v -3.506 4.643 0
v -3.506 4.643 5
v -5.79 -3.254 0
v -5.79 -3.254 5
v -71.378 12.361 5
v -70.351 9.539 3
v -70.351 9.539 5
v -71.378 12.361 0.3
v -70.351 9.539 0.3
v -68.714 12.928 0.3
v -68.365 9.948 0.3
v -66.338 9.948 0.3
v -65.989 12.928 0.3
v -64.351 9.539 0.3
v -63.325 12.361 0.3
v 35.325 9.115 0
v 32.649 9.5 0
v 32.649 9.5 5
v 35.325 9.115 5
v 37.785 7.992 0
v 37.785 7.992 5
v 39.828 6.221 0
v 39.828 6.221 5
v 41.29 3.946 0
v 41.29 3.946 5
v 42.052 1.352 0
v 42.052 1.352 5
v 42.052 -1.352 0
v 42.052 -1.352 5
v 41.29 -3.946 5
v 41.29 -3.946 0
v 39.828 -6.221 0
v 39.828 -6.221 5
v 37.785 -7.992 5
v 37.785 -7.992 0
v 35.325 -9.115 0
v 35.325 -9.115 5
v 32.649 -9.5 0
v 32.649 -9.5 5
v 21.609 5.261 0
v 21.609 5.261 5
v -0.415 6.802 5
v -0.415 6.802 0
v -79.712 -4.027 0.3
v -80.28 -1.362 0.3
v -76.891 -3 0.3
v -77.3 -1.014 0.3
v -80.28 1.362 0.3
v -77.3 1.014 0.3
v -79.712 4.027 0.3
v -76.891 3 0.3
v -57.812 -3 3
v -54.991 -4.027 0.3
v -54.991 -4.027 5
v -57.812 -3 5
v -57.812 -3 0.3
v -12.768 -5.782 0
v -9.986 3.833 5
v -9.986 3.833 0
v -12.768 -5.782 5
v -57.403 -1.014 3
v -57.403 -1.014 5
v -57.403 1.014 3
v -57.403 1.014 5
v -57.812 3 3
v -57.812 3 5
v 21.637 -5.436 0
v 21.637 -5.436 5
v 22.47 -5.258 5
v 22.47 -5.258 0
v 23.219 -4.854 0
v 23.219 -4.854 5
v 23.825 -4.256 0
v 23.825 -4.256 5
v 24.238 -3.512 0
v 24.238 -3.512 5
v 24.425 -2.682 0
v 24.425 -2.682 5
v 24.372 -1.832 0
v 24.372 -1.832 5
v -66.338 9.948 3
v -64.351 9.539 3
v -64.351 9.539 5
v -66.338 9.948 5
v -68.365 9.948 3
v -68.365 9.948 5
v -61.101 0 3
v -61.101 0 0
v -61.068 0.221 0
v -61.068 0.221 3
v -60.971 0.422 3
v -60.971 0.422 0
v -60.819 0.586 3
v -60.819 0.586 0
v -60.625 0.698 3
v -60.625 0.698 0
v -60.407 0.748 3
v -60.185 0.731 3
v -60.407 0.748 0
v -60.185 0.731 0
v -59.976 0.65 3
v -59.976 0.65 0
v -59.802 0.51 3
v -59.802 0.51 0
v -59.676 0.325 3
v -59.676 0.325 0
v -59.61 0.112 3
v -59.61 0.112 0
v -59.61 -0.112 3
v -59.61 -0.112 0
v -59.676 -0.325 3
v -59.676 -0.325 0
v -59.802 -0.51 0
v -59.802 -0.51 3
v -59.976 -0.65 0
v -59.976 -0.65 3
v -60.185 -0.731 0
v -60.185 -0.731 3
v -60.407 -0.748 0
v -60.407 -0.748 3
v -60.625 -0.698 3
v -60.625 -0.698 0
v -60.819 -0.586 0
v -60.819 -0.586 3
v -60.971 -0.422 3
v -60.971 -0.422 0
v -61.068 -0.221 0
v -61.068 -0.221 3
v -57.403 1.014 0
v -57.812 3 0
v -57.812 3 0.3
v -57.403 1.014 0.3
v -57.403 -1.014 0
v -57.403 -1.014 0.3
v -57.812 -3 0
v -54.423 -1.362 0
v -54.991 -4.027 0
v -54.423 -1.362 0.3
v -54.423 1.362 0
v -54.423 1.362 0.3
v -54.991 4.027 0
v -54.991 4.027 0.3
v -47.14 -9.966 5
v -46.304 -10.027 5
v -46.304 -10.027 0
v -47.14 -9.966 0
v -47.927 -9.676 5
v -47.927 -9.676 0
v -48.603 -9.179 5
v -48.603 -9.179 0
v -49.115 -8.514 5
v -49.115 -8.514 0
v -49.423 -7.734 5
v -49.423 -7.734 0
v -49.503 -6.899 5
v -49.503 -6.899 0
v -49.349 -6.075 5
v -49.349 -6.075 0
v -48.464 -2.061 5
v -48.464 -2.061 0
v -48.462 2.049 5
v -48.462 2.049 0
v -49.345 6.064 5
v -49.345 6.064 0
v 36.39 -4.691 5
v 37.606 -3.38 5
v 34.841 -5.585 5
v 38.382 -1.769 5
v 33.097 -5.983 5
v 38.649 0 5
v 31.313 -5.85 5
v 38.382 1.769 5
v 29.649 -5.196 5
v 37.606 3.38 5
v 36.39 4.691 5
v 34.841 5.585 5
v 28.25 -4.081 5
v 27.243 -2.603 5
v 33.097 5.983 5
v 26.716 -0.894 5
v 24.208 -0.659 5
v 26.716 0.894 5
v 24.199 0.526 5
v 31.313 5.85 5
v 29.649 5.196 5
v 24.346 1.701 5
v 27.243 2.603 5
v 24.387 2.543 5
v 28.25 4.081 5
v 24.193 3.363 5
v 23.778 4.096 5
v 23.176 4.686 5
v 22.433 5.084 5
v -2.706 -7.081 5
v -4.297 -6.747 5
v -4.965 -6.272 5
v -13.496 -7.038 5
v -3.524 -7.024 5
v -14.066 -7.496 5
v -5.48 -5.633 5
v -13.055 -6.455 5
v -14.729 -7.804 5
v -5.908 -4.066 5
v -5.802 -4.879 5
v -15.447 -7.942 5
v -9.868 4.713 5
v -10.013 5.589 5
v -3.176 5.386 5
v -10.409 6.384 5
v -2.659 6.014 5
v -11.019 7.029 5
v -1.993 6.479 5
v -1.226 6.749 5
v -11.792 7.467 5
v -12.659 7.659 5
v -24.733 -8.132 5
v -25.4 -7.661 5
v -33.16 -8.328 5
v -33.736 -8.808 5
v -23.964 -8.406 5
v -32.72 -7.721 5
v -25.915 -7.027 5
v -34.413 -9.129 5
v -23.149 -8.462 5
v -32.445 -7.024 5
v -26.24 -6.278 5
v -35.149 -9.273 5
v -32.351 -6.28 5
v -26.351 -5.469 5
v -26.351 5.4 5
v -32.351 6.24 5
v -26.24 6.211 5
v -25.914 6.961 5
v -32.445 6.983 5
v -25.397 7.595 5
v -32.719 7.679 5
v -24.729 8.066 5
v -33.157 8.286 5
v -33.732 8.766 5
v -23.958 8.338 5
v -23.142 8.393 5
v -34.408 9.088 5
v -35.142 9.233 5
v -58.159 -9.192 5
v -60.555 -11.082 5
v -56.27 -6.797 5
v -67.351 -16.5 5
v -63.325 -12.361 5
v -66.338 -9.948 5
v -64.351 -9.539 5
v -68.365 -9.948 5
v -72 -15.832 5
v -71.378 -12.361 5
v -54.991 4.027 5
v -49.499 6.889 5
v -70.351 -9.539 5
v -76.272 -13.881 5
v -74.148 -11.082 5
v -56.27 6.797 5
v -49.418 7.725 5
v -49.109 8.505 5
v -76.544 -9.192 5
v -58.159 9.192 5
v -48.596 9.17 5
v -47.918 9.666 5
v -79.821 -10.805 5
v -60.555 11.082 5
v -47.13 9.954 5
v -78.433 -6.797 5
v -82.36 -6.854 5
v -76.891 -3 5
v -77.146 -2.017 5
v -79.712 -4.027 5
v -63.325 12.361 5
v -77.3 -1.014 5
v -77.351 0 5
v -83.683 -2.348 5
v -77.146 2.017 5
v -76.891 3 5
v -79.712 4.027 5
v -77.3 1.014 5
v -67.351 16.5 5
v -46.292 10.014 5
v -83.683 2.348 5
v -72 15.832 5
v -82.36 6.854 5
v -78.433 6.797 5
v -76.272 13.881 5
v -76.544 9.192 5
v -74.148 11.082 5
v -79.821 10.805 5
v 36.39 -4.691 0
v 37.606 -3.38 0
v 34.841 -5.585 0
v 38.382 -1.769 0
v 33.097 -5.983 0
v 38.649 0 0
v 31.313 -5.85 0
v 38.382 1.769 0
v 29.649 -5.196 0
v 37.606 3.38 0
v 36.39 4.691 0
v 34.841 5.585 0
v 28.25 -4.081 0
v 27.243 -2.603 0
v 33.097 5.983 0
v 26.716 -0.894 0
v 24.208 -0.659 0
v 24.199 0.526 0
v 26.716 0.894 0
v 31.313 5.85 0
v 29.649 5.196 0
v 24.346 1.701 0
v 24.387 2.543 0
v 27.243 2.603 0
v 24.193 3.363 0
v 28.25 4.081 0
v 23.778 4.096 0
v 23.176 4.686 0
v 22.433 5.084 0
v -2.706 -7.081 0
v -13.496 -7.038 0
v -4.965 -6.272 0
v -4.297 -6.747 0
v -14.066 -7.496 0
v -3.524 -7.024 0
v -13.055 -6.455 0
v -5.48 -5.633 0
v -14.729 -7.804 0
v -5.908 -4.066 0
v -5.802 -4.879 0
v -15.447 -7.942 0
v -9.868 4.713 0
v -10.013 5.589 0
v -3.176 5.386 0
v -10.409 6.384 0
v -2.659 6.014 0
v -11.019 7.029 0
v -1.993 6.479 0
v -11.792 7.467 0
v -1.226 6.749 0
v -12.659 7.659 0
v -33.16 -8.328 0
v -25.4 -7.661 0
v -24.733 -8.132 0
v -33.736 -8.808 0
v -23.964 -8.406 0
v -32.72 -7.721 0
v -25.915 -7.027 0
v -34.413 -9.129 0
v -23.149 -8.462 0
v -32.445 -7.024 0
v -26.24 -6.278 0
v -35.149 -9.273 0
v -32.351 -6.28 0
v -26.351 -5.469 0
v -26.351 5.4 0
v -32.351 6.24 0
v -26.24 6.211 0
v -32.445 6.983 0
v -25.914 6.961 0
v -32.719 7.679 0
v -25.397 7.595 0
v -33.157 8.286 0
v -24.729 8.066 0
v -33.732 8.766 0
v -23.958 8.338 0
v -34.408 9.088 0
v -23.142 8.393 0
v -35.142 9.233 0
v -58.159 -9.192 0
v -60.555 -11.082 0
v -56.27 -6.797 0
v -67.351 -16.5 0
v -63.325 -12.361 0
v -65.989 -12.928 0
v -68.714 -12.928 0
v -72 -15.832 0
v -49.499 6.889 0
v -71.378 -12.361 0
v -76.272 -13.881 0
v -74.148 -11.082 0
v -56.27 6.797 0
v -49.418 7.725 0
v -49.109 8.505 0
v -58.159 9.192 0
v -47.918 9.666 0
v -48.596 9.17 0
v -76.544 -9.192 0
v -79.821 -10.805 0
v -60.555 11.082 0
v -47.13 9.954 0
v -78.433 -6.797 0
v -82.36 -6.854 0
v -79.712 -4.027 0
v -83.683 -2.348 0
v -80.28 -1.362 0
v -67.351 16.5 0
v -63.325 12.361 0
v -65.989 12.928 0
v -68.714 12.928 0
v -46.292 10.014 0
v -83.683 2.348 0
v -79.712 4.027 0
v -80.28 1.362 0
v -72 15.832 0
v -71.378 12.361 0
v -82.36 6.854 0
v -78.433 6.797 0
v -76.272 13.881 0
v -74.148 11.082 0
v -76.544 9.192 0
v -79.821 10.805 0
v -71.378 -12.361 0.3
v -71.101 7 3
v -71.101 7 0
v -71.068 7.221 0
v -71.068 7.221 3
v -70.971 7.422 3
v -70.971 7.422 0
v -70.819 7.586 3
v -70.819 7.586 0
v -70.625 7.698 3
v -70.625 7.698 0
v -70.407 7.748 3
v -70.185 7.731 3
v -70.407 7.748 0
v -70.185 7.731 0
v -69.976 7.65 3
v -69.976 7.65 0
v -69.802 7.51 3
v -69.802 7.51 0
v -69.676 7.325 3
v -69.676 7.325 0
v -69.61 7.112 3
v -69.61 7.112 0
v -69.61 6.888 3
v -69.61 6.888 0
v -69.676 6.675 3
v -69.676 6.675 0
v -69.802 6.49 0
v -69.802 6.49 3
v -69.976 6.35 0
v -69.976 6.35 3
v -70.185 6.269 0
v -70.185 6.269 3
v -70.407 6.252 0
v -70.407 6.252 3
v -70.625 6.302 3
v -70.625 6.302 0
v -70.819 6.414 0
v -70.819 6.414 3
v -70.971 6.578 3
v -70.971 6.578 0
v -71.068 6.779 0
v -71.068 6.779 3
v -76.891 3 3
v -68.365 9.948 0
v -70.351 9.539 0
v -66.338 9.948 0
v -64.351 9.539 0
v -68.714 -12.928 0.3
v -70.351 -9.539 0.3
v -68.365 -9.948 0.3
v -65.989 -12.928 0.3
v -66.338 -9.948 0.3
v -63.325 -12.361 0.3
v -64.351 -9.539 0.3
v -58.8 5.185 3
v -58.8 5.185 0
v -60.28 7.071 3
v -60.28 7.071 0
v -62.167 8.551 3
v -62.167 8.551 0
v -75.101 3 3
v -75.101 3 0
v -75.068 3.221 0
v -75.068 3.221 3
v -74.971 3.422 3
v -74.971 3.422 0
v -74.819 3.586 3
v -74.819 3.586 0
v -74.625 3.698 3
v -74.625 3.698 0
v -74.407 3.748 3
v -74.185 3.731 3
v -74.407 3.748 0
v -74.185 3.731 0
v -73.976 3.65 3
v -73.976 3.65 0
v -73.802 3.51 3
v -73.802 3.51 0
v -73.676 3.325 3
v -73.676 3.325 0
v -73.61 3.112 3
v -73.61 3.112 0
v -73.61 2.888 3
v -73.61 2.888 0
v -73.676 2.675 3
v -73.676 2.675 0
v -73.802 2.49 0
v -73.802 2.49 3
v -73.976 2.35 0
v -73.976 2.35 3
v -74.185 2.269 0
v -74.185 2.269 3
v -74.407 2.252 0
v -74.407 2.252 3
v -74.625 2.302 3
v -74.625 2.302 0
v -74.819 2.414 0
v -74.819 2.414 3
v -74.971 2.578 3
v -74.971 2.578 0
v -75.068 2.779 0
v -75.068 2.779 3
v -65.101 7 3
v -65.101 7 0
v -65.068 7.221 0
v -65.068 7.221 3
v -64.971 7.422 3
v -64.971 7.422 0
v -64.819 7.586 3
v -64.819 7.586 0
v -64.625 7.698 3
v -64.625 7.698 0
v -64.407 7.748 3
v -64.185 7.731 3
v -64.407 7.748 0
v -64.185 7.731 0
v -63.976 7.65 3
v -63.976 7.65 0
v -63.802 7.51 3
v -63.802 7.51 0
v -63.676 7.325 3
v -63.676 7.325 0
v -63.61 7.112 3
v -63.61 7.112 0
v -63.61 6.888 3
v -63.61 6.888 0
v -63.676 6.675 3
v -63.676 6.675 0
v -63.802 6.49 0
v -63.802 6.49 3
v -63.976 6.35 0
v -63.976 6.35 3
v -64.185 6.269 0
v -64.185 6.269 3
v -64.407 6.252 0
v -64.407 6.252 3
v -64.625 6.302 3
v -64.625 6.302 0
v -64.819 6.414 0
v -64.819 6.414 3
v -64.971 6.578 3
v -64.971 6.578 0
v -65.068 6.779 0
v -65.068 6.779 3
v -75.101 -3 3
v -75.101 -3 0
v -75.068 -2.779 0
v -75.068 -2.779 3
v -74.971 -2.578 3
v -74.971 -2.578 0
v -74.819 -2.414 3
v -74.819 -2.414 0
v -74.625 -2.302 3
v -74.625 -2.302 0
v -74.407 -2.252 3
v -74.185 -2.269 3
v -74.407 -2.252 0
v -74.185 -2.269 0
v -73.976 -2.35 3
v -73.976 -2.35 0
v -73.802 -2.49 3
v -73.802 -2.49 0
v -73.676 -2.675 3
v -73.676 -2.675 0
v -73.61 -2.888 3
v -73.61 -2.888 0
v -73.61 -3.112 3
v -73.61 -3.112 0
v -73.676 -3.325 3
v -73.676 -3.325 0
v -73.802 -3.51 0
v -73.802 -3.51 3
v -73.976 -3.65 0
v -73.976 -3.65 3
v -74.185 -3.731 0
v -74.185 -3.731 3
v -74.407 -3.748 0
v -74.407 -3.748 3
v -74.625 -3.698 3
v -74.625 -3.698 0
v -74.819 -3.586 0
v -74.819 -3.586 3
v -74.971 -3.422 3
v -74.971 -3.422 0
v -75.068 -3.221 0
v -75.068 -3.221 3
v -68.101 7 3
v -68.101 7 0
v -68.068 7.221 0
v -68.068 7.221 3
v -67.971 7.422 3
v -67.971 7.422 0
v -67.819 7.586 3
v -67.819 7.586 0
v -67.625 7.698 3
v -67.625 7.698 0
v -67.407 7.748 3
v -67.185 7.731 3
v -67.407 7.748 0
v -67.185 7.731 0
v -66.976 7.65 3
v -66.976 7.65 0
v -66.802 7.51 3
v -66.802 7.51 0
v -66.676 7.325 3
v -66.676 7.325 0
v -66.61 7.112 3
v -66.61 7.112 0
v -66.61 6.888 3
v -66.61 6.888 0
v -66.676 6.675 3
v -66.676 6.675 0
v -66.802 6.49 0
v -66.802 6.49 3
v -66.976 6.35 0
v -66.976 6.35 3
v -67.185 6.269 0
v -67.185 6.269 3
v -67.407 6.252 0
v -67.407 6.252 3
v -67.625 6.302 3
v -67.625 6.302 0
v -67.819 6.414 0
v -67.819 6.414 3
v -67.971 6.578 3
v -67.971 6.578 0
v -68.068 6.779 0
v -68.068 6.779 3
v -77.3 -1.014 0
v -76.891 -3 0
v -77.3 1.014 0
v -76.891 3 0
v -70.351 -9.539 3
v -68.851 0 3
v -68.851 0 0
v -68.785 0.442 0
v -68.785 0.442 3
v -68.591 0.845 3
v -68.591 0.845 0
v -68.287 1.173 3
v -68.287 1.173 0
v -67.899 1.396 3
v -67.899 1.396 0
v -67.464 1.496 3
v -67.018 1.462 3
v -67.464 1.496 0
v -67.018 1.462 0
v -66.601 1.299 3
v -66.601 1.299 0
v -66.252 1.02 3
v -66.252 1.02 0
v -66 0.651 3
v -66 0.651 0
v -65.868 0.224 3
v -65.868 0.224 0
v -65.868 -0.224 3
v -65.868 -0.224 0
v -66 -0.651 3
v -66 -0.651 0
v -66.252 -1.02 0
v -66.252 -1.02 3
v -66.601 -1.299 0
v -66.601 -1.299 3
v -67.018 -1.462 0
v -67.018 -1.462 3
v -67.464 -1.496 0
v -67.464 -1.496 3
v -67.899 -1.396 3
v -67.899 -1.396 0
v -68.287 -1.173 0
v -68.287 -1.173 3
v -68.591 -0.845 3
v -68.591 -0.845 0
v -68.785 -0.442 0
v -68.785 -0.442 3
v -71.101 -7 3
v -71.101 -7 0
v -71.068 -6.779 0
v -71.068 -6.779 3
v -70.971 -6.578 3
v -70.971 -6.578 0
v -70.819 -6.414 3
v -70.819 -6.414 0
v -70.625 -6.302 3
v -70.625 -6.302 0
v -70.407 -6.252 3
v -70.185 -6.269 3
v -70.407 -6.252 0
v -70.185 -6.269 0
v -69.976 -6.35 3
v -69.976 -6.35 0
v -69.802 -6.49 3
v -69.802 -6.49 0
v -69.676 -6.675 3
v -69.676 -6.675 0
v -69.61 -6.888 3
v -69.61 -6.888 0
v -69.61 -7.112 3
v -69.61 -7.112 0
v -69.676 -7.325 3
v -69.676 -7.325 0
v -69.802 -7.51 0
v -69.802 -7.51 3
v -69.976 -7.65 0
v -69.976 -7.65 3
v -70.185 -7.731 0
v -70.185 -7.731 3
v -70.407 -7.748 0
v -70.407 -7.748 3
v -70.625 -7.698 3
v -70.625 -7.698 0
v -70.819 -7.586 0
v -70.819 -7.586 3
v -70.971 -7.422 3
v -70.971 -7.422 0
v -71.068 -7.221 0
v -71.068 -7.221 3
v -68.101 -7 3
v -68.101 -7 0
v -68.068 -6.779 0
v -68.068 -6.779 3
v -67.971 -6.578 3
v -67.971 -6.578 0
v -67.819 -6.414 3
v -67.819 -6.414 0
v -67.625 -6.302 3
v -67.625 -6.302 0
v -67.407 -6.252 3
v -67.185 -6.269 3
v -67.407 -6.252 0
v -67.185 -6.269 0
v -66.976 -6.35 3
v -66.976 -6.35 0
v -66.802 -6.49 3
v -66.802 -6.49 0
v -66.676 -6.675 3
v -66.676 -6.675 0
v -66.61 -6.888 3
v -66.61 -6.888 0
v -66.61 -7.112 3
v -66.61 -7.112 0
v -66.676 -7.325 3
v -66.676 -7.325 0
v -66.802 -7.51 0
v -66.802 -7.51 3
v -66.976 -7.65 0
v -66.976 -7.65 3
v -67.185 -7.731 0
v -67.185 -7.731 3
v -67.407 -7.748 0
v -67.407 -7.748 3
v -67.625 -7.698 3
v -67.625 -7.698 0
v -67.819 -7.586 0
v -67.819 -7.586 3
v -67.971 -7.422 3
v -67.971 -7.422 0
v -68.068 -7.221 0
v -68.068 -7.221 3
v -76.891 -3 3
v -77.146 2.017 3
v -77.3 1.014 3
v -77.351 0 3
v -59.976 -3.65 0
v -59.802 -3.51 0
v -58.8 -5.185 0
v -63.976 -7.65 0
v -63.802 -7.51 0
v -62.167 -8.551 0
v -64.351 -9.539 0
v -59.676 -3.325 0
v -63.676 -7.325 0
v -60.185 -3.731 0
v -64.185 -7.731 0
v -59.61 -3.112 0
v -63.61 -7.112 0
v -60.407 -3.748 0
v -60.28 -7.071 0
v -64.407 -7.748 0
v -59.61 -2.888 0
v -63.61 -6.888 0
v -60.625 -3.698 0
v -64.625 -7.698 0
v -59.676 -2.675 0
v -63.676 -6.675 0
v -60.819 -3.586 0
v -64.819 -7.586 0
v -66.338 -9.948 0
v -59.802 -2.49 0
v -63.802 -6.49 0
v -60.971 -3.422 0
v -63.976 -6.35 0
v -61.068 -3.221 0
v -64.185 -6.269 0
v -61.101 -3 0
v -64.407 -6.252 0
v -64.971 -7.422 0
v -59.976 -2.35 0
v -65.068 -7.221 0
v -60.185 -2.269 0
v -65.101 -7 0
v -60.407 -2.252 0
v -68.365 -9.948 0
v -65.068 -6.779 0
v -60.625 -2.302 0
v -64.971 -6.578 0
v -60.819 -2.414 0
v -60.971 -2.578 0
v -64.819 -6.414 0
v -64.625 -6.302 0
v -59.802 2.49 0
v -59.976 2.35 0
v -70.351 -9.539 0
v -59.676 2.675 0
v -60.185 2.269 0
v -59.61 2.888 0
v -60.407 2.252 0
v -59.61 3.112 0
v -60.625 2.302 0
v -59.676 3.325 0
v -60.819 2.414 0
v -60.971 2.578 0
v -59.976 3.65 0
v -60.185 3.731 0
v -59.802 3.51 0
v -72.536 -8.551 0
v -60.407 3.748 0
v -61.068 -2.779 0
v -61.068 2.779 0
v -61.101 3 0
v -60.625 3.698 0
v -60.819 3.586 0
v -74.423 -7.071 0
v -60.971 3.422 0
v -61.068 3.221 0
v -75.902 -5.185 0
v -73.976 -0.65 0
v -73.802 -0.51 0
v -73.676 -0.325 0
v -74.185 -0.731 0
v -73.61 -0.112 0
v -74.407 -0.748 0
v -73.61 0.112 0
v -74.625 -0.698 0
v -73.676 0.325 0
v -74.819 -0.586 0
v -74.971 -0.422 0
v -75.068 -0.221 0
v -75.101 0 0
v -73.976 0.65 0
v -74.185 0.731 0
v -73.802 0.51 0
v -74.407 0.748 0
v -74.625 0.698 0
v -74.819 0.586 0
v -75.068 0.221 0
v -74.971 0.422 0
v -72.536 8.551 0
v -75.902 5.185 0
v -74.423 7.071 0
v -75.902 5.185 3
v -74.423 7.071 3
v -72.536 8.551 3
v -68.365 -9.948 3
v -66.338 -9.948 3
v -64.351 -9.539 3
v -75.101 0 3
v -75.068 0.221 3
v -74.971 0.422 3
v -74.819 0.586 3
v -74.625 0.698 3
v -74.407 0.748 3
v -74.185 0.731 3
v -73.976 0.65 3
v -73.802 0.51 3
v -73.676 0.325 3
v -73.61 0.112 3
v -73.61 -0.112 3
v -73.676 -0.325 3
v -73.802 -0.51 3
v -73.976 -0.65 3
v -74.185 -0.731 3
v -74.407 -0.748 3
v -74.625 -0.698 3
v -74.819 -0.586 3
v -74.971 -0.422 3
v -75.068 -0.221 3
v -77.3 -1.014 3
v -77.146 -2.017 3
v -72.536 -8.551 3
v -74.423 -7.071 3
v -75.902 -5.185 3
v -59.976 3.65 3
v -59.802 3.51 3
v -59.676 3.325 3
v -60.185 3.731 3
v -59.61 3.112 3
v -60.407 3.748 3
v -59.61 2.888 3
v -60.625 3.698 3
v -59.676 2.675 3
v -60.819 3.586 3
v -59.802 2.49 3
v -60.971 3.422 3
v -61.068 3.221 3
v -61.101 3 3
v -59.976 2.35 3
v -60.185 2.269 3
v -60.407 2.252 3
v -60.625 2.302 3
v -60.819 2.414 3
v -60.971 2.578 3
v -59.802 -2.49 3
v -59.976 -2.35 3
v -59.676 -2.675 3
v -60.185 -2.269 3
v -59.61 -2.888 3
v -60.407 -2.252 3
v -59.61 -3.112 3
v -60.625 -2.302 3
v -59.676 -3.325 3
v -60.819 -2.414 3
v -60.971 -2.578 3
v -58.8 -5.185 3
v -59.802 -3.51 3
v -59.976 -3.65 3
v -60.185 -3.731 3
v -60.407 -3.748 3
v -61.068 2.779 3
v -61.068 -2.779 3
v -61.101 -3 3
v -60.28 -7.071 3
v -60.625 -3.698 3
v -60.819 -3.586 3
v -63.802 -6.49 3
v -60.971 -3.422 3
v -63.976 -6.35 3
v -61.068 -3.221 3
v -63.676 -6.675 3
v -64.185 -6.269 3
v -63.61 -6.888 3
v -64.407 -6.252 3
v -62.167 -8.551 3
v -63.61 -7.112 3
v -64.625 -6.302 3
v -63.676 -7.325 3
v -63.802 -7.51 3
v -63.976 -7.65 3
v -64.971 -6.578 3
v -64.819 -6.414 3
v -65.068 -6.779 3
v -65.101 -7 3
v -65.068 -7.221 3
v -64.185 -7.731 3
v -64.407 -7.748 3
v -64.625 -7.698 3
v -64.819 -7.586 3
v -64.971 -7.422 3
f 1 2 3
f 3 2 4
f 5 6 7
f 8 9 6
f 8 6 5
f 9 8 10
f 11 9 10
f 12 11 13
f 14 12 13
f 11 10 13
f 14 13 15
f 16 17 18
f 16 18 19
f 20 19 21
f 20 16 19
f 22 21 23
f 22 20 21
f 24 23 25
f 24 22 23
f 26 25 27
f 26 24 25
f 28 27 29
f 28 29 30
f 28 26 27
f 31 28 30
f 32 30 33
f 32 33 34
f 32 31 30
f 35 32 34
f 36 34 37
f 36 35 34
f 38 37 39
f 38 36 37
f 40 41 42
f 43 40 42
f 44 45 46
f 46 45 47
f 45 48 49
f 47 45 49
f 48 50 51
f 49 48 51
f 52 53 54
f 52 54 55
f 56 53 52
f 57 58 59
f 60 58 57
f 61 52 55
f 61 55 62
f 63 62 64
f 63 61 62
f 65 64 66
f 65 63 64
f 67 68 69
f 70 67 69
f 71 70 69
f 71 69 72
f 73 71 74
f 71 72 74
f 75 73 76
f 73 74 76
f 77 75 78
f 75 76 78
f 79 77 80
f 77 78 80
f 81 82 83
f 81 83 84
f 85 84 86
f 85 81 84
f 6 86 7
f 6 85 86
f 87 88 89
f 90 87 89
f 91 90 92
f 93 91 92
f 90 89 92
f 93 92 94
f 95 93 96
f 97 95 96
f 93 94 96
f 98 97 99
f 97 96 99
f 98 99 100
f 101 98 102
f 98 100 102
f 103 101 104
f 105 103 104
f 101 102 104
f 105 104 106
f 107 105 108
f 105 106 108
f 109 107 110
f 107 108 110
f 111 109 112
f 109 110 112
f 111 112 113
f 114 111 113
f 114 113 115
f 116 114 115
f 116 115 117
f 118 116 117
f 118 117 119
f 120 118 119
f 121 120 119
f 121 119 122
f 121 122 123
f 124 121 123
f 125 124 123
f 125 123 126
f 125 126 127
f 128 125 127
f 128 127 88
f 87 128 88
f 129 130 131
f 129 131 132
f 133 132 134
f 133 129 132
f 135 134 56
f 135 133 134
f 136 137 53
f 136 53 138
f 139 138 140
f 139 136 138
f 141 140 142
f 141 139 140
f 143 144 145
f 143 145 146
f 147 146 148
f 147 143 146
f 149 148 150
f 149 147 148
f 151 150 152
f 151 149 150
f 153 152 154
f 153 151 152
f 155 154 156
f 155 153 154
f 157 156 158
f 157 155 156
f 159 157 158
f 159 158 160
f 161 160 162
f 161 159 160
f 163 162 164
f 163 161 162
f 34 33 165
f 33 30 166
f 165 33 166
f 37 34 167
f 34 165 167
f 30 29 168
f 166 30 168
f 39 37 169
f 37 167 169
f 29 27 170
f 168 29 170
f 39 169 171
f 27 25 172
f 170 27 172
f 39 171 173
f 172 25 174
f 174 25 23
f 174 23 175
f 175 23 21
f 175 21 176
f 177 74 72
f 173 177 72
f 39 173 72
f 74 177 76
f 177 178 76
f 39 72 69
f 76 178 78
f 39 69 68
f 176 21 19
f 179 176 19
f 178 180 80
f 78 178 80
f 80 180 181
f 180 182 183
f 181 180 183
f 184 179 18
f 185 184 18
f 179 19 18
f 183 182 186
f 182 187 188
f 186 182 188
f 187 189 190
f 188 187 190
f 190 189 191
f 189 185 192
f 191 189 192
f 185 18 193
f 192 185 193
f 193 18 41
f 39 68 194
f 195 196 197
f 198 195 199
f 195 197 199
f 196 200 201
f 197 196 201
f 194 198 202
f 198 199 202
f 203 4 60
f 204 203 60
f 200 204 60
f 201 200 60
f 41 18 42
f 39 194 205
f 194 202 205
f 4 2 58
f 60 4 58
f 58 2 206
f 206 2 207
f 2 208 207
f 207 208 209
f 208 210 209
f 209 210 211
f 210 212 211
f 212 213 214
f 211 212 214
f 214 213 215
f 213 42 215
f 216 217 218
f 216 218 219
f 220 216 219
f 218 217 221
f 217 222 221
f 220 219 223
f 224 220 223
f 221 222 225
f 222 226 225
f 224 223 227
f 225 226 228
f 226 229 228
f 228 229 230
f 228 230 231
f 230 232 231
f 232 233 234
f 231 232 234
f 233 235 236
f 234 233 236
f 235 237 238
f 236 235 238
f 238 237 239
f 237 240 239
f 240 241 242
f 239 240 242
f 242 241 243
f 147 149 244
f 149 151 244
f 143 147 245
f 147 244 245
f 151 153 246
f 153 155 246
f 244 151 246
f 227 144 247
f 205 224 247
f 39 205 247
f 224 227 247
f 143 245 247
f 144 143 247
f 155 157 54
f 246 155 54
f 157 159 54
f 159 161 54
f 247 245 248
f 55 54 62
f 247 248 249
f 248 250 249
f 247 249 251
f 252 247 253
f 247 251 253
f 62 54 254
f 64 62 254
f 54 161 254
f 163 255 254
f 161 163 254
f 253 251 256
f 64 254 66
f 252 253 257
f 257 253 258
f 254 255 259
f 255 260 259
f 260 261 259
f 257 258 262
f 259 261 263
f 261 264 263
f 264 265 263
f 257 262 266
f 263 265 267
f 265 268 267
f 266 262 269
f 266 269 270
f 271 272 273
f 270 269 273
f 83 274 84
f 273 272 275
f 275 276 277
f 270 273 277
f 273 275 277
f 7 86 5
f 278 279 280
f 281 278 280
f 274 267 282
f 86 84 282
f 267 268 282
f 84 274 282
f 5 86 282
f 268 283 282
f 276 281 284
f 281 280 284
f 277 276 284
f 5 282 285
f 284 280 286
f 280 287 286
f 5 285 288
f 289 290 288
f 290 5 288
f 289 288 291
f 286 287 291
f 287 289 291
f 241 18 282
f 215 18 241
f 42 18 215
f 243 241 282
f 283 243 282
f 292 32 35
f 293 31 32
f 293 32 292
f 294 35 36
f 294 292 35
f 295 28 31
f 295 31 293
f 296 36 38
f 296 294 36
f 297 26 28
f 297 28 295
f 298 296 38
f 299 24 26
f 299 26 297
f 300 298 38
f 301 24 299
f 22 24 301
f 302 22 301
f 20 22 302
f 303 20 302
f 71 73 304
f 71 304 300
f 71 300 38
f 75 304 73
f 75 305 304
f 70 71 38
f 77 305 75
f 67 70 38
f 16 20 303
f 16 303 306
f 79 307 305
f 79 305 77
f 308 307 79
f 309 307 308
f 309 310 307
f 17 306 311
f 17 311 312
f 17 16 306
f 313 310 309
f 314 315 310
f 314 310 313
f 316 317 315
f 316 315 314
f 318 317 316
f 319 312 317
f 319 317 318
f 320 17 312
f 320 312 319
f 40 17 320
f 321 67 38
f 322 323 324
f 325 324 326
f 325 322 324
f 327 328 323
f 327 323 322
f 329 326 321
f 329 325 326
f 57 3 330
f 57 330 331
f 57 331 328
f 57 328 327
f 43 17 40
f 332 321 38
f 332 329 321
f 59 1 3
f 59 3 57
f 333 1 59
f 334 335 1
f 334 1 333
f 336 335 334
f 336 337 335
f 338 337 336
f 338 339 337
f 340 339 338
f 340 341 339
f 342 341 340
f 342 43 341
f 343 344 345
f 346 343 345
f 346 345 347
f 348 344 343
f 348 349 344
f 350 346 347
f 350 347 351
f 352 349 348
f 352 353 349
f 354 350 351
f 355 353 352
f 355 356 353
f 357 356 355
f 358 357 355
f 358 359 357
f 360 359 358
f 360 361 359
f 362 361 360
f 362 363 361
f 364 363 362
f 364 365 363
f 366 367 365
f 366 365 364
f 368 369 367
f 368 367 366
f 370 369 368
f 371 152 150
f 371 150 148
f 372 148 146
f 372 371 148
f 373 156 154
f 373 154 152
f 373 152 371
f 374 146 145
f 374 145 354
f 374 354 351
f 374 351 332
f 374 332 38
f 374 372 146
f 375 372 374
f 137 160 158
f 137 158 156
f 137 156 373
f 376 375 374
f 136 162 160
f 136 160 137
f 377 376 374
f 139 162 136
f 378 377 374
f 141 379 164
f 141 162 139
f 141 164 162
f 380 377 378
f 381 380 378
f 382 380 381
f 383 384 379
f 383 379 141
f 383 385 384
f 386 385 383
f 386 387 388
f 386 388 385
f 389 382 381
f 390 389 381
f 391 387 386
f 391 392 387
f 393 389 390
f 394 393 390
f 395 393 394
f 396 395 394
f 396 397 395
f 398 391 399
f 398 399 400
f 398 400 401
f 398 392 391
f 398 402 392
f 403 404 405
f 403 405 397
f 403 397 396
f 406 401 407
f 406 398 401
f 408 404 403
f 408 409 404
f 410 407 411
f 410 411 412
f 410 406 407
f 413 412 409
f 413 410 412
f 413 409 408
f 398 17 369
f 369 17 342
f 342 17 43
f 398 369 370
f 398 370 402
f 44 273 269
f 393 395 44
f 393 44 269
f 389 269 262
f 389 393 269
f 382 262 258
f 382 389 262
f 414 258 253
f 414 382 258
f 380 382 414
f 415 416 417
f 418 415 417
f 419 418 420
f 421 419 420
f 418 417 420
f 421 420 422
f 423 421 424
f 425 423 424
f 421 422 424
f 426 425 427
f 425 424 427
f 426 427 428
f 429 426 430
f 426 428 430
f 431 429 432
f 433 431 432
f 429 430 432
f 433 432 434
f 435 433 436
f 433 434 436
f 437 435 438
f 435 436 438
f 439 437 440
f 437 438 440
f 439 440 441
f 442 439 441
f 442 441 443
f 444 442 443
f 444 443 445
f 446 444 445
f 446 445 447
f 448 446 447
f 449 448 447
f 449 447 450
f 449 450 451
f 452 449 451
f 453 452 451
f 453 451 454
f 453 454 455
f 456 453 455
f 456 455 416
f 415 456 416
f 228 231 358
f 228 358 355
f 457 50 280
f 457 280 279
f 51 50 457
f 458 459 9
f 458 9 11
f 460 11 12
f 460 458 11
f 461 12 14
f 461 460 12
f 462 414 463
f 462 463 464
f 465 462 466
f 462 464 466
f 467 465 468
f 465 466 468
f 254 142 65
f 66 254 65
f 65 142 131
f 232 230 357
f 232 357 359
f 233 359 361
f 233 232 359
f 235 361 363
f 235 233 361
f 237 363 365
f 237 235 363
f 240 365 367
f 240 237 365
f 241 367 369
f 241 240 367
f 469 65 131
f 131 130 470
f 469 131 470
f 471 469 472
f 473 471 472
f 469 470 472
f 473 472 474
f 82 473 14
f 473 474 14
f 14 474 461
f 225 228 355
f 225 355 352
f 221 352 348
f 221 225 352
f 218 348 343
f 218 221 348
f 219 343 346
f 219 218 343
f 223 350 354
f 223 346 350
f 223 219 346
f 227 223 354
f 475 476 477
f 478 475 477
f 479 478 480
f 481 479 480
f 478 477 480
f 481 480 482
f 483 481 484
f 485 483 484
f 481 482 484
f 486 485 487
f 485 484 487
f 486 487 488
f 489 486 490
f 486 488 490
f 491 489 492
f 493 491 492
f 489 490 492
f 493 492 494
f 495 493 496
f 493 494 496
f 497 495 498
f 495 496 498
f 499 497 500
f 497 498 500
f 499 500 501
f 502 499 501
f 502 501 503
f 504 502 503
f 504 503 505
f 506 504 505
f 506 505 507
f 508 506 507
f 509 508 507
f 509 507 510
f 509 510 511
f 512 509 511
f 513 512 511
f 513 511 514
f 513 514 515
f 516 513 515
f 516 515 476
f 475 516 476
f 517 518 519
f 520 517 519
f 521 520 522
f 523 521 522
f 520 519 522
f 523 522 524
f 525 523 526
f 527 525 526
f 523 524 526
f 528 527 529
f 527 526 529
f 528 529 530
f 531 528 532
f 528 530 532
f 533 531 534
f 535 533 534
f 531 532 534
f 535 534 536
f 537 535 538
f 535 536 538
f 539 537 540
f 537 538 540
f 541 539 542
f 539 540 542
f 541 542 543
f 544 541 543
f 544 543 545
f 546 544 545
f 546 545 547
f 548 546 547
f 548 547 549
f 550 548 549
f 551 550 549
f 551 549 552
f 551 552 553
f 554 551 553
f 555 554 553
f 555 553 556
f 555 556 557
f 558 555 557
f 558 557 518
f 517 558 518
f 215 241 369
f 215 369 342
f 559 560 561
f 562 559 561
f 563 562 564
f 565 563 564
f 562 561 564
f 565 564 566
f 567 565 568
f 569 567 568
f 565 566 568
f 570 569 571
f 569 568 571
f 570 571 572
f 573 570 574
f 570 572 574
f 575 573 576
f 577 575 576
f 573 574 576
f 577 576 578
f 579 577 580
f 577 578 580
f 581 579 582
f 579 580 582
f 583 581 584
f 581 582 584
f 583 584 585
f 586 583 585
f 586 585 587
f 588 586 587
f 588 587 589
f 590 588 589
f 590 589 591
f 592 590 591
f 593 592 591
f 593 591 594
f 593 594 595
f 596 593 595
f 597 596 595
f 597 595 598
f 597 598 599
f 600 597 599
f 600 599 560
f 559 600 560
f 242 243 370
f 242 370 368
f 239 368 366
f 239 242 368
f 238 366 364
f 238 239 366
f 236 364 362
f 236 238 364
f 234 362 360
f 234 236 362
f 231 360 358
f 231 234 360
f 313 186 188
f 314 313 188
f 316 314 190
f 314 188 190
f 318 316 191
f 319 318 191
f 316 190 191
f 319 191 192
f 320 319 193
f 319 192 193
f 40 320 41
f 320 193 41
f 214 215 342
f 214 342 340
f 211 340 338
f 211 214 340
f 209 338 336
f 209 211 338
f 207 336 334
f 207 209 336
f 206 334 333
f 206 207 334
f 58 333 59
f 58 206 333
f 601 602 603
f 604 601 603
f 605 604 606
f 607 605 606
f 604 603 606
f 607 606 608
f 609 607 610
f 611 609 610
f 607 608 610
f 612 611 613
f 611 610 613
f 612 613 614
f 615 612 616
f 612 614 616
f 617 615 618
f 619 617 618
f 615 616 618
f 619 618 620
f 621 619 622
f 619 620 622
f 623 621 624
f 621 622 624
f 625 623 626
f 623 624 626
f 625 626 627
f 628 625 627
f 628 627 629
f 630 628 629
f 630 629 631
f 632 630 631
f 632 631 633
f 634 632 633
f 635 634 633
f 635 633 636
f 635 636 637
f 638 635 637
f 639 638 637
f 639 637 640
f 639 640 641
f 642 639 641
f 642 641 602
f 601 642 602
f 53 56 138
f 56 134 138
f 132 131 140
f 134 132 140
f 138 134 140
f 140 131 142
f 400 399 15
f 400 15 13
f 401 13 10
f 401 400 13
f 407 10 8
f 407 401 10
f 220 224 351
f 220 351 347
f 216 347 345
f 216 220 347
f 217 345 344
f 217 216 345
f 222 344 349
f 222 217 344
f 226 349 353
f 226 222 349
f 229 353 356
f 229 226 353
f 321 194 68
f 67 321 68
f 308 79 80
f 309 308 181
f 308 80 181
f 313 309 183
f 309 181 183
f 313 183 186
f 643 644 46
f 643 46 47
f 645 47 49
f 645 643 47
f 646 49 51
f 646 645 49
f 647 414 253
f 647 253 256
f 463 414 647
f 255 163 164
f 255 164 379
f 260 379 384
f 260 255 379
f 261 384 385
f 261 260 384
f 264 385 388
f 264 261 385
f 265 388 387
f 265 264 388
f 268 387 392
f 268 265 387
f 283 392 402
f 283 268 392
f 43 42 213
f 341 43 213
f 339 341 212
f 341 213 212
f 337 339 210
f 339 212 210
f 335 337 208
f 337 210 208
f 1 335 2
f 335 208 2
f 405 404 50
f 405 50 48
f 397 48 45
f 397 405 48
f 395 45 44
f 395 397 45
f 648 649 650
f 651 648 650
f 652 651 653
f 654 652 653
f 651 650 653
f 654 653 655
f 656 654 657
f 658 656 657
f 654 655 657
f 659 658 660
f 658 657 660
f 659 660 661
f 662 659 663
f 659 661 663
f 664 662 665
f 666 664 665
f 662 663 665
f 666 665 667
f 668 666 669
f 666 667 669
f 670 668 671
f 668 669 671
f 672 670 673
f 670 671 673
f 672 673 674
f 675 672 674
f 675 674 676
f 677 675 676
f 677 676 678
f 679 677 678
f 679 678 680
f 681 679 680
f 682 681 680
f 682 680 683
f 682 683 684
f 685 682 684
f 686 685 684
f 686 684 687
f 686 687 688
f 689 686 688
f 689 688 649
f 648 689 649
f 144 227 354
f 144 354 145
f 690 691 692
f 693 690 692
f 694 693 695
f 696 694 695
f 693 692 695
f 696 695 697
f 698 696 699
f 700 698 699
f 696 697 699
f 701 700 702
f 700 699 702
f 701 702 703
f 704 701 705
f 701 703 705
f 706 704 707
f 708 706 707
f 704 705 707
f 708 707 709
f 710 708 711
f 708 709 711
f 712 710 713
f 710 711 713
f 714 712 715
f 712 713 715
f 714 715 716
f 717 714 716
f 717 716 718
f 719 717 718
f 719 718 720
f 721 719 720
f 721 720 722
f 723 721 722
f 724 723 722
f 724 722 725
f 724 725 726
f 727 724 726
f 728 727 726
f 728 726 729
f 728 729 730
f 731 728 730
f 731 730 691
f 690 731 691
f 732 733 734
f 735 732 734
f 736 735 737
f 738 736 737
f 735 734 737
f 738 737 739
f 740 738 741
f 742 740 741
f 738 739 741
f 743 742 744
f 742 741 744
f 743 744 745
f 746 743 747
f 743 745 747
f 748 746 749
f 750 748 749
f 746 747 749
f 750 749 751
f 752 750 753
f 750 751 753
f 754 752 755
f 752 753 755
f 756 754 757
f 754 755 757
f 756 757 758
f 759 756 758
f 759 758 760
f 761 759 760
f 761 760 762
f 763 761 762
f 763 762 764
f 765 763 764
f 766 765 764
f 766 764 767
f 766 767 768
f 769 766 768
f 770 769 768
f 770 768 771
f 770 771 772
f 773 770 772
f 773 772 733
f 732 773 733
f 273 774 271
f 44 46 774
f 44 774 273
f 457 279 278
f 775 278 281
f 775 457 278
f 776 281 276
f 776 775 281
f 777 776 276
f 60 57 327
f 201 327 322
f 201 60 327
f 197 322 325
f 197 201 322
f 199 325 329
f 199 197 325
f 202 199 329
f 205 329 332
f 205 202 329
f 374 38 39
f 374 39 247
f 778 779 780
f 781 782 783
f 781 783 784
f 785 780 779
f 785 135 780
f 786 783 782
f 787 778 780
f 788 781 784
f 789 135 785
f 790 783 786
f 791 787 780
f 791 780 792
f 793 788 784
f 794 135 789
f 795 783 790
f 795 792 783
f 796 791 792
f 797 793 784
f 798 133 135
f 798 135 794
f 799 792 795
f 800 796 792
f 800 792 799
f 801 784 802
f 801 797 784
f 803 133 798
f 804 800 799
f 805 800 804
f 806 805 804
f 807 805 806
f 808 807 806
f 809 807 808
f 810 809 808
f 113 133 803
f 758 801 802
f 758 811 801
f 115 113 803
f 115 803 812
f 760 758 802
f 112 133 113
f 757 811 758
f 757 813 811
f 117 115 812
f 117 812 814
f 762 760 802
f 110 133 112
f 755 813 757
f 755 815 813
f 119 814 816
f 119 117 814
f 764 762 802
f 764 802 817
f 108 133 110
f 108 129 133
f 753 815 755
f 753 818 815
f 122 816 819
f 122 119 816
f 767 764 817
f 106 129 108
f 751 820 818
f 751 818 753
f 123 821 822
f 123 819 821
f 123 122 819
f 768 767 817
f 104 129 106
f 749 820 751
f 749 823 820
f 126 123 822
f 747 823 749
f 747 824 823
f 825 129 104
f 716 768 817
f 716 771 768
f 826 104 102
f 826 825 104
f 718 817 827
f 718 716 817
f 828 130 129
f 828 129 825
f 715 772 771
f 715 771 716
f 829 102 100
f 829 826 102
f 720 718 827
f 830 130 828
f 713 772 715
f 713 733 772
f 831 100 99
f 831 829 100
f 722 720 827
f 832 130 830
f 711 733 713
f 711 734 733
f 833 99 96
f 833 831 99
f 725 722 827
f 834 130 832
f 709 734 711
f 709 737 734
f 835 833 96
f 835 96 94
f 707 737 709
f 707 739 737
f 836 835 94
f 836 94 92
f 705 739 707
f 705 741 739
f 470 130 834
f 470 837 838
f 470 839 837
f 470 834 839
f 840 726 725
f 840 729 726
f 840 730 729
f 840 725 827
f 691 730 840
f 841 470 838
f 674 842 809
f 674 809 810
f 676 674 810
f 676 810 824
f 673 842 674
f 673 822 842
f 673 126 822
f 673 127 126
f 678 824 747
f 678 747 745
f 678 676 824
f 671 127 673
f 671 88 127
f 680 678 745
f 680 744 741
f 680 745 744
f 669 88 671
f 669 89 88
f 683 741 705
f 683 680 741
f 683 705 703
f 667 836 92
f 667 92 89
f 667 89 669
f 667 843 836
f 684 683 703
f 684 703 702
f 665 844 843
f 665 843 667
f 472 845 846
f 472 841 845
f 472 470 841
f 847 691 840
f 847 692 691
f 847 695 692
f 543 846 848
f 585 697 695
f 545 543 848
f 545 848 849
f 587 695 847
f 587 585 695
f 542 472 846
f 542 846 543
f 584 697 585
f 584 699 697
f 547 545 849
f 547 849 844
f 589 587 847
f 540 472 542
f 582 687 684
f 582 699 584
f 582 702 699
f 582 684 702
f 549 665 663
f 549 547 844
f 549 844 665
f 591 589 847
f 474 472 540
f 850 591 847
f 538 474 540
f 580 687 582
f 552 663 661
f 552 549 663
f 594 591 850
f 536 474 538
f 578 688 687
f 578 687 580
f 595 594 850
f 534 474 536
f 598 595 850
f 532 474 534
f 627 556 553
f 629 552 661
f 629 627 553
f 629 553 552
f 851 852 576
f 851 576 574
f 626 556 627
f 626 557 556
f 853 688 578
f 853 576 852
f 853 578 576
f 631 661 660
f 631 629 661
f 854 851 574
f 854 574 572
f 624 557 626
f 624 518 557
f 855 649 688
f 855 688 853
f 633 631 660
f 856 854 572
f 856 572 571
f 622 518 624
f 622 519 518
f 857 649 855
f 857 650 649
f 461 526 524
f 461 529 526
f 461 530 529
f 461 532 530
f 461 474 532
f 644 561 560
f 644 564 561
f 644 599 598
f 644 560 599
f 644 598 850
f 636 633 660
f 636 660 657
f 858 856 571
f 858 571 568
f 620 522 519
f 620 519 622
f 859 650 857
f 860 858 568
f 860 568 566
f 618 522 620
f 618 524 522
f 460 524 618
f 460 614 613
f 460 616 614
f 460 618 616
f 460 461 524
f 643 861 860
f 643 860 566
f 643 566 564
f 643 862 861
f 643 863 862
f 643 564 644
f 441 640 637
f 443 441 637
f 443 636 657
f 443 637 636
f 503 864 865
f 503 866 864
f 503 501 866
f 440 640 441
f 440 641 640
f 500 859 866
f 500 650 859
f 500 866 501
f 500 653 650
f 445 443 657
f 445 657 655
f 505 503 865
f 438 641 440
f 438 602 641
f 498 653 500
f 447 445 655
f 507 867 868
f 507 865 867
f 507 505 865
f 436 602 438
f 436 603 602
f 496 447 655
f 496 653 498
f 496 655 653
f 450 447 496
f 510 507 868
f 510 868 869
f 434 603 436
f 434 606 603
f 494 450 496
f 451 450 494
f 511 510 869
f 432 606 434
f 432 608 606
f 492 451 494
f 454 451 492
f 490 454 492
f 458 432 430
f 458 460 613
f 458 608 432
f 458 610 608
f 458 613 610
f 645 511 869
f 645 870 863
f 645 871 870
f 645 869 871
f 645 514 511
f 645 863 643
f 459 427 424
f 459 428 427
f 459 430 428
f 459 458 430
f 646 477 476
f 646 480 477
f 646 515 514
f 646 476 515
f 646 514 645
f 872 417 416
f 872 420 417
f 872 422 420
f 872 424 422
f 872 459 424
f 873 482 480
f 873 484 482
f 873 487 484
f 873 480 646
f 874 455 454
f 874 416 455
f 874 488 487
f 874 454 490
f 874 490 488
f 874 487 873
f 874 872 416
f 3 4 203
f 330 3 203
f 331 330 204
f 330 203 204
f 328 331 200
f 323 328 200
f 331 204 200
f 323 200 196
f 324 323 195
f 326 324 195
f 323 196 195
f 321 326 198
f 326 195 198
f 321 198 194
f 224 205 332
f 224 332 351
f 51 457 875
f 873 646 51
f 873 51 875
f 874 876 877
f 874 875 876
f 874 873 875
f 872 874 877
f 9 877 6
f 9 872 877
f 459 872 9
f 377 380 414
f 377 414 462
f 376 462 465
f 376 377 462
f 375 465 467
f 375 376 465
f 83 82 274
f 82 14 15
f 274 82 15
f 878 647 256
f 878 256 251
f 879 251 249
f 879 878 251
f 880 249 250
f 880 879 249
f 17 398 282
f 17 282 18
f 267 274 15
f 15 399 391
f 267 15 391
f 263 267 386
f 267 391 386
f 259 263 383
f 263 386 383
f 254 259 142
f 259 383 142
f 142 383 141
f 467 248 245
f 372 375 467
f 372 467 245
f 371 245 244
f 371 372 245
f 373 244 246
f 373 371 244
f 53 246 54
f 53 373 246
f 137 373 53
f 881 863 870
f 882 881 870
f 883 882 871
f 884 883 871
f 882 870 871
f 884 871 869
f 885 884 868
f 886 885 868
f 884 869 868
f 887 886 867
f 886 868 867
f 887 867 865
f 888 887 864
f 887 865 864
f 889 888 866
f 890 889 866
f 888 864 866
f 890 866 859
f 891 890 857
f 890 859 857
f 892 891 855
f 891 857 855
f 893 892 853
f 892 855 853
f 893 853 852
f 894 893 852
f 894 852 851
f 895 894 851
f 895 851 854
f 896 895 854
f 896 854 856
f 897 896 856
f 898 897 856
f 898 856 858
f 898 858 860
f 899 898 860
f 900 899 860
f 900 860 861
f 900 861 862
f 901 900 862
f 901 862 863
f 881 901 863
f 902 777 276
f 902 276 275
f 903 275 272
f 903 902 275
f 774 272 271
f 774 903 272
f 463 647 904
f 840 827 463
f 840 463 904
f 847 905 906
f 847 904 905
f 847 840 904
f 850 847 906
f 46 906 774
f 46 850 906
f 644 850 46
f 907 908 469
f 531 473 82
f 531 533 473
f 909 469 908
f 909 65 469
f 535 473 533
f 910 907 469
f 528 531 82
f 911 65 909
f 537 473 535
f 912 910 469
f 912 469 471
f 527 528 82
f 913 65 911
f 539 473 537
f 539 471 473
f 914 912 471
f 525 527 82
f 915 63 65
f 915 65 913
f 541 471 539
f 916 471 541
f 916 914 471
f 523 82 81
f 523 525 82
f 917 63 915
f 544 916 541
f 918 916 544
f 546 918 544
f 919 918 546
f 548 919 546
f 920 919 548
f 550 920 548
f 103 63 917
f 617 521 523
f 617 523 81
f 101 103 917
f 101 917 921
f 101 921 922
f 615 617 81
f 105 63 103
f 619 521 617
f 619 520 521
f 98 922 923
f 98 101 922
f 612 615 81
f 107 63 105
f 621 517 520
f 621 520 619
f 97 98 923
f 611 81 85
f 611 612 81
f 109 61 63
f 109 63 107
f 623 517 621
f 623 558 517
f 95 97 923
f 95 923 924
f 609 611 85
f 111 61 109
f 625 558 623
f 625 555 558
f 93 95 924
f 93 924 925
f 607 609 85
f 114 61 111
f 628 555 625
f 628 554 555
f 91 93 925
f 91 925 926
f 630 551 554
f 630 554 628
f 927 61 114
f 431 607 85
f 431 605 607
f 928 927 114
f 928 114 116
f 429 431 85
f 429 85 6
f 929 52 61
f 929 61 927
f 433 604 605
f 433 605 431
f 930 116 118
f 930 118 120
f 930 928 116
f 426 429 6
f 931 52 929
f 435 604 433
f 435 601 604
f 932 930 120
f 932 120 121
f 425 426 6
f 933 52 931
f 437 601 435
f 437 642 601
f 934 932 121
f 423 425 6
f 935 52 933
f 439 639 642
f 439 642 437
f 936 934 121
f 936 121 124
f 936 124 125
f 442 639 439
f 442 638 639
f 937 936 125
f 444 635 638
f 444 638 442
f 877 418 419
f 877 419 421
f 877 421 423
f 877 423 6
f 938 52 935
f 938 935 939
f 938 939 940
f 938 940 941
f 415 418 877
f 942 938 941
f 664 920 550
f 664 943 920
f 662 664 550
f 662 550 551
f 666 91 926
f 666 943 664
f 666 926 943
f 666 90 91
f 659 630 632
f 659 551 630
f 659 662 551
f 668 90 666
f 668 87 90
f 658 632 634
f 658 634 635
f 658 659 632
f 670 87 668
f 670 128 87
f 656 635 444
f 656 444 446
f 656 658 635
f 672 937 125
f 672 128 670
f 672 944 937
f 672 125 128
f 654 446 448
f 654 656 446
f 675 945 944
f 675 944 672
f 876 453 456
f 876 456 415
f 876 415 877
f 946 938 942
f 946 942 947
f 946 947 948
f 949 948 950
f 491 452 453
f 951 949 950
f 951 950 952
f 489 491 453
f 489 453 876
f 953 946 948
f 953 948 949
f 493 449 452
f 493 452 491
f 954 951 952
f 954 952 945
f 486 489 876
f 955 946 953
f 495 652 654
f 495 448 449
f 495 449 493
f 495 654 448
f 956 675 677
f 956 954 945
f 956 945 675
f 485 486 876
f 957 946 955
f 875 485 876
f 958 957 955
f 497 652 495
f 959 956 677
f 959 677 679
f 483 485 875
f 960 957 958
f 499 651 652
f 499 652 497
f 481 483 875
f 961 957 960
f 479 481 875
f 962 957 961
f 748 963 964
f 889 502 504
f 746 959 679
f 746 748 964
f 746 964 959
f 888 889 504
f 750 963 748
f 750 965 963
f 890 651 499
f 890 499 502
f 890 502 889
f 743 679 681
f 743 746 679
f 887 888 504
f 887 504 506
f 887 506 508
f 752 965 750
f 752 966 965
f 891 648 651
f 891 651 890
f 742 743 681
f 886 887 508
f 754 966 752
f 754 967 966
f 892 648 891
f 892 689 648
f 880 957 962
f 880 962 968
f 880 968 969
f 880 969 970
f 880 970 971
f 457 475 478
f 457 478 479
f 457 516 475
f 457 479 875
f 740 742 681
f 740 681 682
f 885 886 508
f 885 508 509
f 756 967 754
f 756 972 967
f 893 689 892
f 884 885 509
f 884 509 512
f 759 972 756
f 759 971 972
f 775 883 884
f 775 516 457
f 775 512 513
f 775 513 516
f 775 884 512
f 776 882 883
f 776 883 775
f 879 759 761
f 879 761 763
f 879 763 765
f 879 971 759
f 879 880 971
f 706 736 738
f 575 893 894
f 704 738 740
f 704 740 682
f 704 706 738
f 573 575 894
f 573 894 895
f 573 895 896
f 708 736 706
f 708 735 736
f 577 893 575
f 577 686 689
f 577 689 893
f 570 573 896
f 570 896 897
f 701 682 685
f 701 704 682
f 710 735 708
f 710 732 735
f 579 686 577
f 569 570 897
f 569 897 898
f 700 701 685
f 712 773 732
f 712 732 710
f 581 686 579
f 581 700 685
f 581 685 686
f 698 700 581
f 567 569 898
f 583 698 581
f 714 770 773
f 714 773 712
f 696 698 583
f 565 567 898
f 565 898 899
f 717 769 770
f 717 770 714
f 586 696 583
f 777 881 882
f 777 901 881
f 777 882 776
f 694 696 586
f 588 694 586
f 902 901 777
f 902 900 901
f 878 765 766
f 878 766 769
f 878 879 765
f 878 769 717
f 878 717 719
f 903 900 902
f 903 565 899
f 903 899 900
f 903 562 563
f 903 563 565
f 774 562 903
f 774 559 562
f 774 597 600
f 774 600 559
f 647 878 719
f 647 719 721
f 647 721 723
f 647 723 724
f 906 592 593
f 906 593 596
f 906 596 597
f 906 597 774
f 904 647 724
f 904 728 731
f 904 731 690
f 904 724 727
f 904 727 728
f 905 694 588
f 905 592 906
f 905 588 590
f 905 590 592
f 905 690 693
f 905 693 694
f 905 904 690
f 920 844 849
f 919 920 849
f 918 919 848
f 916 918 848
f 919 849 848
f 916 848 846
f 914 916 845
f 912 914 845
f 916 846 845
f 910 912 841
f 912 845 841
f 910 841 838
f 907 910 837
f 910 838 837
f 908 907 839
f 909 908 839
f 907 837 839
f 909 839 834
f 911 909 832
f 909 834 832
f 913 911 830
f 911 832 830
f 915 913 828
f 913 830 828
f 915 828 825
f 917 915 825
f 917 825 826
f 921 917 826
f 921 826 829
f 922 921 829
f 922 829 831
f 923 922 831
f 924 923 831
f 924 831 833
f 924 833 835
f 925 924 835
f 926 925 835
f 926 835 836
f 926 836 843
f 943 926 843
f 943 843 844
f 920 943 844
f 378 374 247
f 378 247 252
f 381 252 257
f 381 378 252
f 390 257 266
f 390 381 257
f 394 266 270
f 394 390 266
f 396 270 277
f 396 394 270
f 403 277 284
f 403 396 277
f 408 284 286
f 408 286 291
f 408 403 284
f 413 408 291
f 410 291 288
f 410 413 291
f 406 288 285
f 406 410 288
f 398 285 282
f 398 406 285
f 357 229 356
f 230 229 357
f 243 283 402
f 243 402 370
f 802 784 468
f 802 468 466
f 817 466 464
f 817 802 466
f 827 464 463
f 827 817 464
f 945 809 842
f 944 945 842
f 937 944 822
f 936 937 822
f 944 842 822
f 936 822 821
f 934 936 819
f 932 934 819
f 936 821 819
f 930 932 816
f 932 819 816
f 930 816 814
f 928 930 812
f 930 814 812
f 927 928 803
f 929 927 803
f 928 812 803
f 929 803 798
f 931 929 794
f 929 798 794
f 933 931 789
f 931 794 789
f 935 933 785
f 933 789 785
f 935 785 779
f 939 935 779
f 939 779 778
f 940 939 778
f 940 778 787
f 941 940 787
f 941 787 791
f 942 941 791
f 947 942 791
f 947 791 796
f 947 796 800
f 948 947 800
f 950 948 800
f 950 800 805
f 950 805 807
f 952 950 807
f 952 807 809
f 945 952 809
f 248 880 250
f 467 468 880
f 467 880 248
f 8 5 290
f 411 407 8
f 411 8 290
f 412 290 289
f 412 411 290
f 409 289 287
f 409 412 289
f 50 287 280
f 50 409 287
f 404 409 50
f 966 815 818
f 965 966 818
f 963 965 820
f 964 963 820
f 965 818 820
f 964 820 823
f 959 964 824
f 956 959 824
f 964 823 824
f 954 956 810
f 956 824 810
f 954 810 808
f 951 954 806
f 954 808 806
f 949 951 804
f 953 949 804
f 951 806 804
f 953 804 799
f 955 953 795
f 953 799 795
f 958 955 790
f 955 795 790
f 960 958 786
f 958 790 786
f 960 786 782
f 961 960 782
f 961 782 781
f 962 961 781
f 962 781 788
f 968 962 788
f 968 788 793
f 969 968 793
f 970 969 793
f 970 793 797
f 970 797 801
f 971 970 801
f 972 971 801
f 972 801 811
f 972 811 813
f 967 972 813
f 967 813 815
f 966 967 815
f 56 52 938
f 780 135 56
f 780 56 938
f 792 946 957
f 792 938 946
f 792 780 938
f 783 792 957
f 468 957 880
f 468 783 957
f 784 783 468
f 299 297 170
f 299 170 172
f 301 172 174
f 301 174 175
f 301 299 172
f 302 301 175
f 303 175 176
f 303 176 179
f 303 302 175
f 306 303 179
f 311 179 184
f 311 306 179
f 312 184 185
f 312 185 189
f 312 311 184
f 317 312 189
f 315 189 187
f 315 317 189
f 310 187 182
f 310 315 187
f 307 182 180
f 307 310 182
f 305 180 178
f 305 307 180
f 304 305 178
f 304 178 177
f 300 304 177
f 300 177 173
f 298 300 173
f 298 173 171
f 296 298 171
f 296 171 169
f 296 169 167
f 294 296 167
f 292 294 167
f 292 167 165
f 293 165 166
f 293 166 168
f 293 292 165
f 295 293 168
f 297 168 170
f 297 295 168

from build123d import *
from build123d.topology import SkipClean

# Parameters (mm, degrees)
SKETCH_1_R          = 6
EXTRUDE_1_DEPTH     = 5
SKETCH_2_R          = 1.5
SKETCH_2_R_2        = 0.75
CUT_EXTRUDE_3_DEPTH = 86.605569128
CUT_EXTRUDE_6_DEPTH = 0.3
CUT_EXTRUDE_8_DEPTH = 86.605569128
CUT_EXTRUDE_START   = -2
SKETCH_9_R          = 10
CUT_EXTRUDE_9_DEPTH = 2


with BuildPart() as part:
    # 草图1 → 凸台-拉伸1 (new body)
    with BuildSketch(Plane.XY):
        with BuildLine():
            Line((-67.351436873, 16.5), (32.648563127, 9.5))
            ThreePointArc((32.648563127, 9.5), (42.148563127, 0), (32.648563127, -9.5))
            Line((32.648563127, -9.5), (-67.351436873, -16.5))
            ThreePointArc((-67.351436873, -16.5), (-83.851436873, 0), (-67.351436873, 16.5))
        make_face()
        with Locations((32.648563127, 0)):
            Circle(SKETCH_1_R, mode=Mode.SUBTRACT)
    extrude(amount=EXTRUDE_1_DEPTH)

    # 草图2 → 切除-拉伸3 (cut, through all)
    with BuildSketch(Plane(origin=(0, 0, 0), x_dir=(-1, 0, 0), z_dir=(0, 0, -1))):
        with Locations((67.351436873, 0)):
            Circle(SKETCH_2_R)
        with Locations((60.351436873, 0)):
            Circle(SKETCH_2_R_2)
        with Locations((60.351436873, 3)):
            Circle(SKETCH_2_R_2)
        with Locations((60.351436873, -3)):
            Circle(SKETCH_2_R_2)
        with Locations((70.351436873, 7)):
            Circle(SKETCH_2_R_2)
        with Locations((67.351436873, 7)):
            Circle(SKETCH_2_R_2)
        with Locations((64.351436873, 7)):
            Circle(SKETCH_2_R_2)
        with Locations((74.351436873, -3)):
            Circle(SKETCH_2_R_2)
        with Locations((74.351436873, 0)):
            Circle(SKETCH_2_R_2)
        with Locations((74.351436873, 3)):
            Circle(SKETCH_2_R_2)
        with Locations((64.351436873, -7)):
            Circle(SKETCH_2_R_2)
        with Locations((67.351436873, -7)):
            Circle(SKETCH_2_R_2)
        with Locations((70.351436873, -7)):
            Circle(SKETCH_2_R_2)
        with BuildLine():
            Line((70.351436873, 9.539392014), (71.378274732, 12.360605845))
            ThreePointArc((71.378274732, 12.360605845), (76.543825029, 9.192388155), (79.712042718, 4.026837859))
            Line((79.712042718, 4.026837859), (76.890828887, 3))
            ThreePointArc((76.890828887, 3), (74.422504685, 7.071067812), (70.351436873, 9.539392014))
        make_face()
        with BuildLine():
            Line((64.351436873, 9.539392014), (63.324599014, 12.360605845))
            ThreePointArc((63.324599014, 12.360605845), (58.159048718, 9.192388155), (54.990831028, 4.026837859))
            Line((54.990831028, 4.026837859), (57.812044859, 3))
            ThreePointArc((57.812044859, 3), (60.280369061, 7.071067812), (64.351436873, 9.539392014))
        make_face()
        with BuildLine():
            Line((76.890828887, -3), (79.712042718, -4.026837859))
            ThreePointArc((79.712042718, -4.026837859), (76.543825029, -9.192388155), (71.378274732, -12.360605845))
            Line((71.378274732, -12.360605845), (70.351436873, -9.539392014))
            ThreePointArc((70.351436873, -9.539392014), (74.422504685, -7.071067812), (76.890828887, -3))
        make_face()
        with BuildLine():
            Line((64.351436873, -9.539392014), (63.324599014, -12.360605845))
            ThreePointArc((63.324599014, -12.360605845), (58.159048718, -9.192388155), (54.990831028, -4.026837859))
            Line((54.990831028, -4.026837859), (57.812044859, -3))
            ThreePointArc((57.812044859, -3), (60.280369061, -7.071067812), (64.351436873, -9.539392014))
        make_face()
    extrude(amount=-CUT_EXTRUDE_3_DEPTH, mode=Mode.SUBTRACT)

    # 草图5 → 切除-拉伸6 (cut)
    with SkipClean():  # the faces are left unmerged after this step: merging them gives an invalid solid
        with BuildSketch(Plane(origin=(0, 0, 0), x_dir=(-1, 0, 0), z_dir=(0, 0, -1))):
            with BuildLine():
                Line((70.351436873, -9.539392014), (71.378274732, -12.360605845))
                ThreePointArc((71.378274732, -12.360605845), (67.351436873, -13), (63.324599014, -12.360605845))
                Line((63.324599014, -12.360605845), (64.351436873, -9.539392014))
                ThreePointArc((64.351436873, -9.539392014), (67.351436873, -10), (70.351436873, -9.539392014))
            make_face()
            with BuildLine():
                Line((57.812044859, -3), (54.990831028, -4.026837859))
                ThreePointArc((54.990831028, -4.026837859), (54.351436873, 0), (54.990831028, 4.026837859))
                Line((54.990831028, 4.026837859), (57.812044859, 3))
                ThreePointArc((57.812044859, 3), (57.351436873, 0), (57.812044859, -3))
            make_face()
            with BuildLine():
                Line((79.712042718, -4.026837859), (76.890828887, -3))
                ThreePointArc((76.890828887, -3), (77.351436873, 0), (76.890828887, 3))
                Line((76.890828887, 3), (79.712042718, 4.026837859))
                ThreePointArc((79.712042718, 4.026837859), (80.351436873, 0), (79.712042718, -4.026837859))
            make_face()
            with BuildLine():
                Line((71.378274732, 12.360605845), (70.351436873, 9.539392014))
                ThreePointArc((70.351436873, 9.539392014), (67.351436873, 10), (64.351436873, 9.539392014))
                Line((64.351436873, 9.539392014), (63.324599014, 12.360605845))
                ThreePointArc((63.324599014, 12.360605845), (67.351436873, 13), (71.378274732, 12.360605845))
            make_face()
        extrude(amount=-CUT_EXTRUDE_6_DEPTH, mode=Mode.SUBTRACT)

    # 草图7 → 切除-拉伸8 (cut, through all)
    with SkipClean():  # the faces are left unmerged after this step: merging them gives an invalid solid
        with BuildSketch(Plane.XY.offset(5)):
            with BuildLine():
                Line((-32.351436873, 6.240423951), (-32.351436873, -6.279908436))
                ThreePointArc((-32.351436873, -6.279908436), (-33.159771035, -8.328469115), (-35.149170775, -9.273082074))
                Line((-35.149170775, -9.273082074), (-46.303856397, -10.026868861))
                ThreePointArc((-46.303856397, -10.026868861), (-48.882666549, -8.864552498), (-49.348665365, -6.074554966))
                ThreePointArc((-49.348665365, -6.074554966), (-48.351437761, -0.005807318), (-49.344955374, 6.063548799))
                ThreePointArc((-49.344955374, 6.063548799), (-48.875599725, 8.855399851), (-46.292339334, 10.013628142))
                Line((-46.292339334, 10.013628142), (-35.14194949, 9.233100853))
                ThreePointArc((-35.14194949, 9.233100853), (-33.157301263, 8.286339132), (-32.351436873, 6.240423951))
            make_face()
            with BuildLine():
                Line((-23.14194949, 8.393100853), (-12.658599808, 7.659266375))
                ThreePointArc((-12.658599808, 7.659266375), (-10.408556973, 6.384352876), (-9.986244931, 3.832931757))
                Line((-9.986244931, 3.832931757), (-12.767703456, -5.782195127))
                ThreePointArc((-12.767703456, -5.782195127), (-13.767045159, -7.284386647), (-15.447279617, -7.941711049))
                Line((-15.447279617, -7.941711049), (-23.149170775, -8.462172493))
                ThreePointArc((-23.149170775, -8.462172493), (-25.399997551, -7.660664694), (-26.351436873, -5.468998855))
                Line((-26.351436873, -5.468998855), (-26.351436873, 5.400423951))
                ThreePointArc((-26.351436873, 5.400423951), (-25.397352054, 7.594559561), (-23.14194949, 8.393100853))
            make_face()
            with BuildLine():
                Line((-3.505857343, 4.643162142), (-5.790312558, -3.25389135))
                ThreePointArc((-5.790312558, -3.25389135), (-5.244319535, -5.970049623), (-2.7062042, -7.080722705))
                Line((-2.7062042, -7.080722705), (21.637024401, -5.435709596))
                ThreePointArc((21.637024401, -5.435709596), (23.82451027, -4.256119574), (24.371955288, -1.831901968))
                ThreePointArc((24.371955288, -1.831901968), (24.183794233, -0.066811207), (24.345729084, 1.700878551))
                ThreePointArc((24.345729084, 1.700878551), (23.778220575, 4.09624397), (21.609277414, 5.26051497))
                Line((21.609277414, 5.26051497), (-0.414527699, 6.802181327))
                ThreePointArc((-0.414527699, 6.802181327), (-2.341778485, 6.269034644), (-3.505857343, 4.643162142))
            make_face()
        extrude(amount=-CUT_EXTRUDE_8_DEPTH, mode=Mode.SUBTRACT)

    # 草图9 → 切除-拉伸9 (cut)
    with SkipClean():  # the faces are left unmerged after this step: merging them gives an invalid solid
        with BuildSketch(Plane.XY.offset(5).offset(CUT_EXTRUDE_START)):
            with Locations(Location((-67.351436873, 0, 0), (0, 0, 180))):
                Circle(SKETCH_9_R)
        extrude(amount=CUT_EXTRUDE_9_DEPTH, mode=Mode.SUBTRACT)


solid = part.part
